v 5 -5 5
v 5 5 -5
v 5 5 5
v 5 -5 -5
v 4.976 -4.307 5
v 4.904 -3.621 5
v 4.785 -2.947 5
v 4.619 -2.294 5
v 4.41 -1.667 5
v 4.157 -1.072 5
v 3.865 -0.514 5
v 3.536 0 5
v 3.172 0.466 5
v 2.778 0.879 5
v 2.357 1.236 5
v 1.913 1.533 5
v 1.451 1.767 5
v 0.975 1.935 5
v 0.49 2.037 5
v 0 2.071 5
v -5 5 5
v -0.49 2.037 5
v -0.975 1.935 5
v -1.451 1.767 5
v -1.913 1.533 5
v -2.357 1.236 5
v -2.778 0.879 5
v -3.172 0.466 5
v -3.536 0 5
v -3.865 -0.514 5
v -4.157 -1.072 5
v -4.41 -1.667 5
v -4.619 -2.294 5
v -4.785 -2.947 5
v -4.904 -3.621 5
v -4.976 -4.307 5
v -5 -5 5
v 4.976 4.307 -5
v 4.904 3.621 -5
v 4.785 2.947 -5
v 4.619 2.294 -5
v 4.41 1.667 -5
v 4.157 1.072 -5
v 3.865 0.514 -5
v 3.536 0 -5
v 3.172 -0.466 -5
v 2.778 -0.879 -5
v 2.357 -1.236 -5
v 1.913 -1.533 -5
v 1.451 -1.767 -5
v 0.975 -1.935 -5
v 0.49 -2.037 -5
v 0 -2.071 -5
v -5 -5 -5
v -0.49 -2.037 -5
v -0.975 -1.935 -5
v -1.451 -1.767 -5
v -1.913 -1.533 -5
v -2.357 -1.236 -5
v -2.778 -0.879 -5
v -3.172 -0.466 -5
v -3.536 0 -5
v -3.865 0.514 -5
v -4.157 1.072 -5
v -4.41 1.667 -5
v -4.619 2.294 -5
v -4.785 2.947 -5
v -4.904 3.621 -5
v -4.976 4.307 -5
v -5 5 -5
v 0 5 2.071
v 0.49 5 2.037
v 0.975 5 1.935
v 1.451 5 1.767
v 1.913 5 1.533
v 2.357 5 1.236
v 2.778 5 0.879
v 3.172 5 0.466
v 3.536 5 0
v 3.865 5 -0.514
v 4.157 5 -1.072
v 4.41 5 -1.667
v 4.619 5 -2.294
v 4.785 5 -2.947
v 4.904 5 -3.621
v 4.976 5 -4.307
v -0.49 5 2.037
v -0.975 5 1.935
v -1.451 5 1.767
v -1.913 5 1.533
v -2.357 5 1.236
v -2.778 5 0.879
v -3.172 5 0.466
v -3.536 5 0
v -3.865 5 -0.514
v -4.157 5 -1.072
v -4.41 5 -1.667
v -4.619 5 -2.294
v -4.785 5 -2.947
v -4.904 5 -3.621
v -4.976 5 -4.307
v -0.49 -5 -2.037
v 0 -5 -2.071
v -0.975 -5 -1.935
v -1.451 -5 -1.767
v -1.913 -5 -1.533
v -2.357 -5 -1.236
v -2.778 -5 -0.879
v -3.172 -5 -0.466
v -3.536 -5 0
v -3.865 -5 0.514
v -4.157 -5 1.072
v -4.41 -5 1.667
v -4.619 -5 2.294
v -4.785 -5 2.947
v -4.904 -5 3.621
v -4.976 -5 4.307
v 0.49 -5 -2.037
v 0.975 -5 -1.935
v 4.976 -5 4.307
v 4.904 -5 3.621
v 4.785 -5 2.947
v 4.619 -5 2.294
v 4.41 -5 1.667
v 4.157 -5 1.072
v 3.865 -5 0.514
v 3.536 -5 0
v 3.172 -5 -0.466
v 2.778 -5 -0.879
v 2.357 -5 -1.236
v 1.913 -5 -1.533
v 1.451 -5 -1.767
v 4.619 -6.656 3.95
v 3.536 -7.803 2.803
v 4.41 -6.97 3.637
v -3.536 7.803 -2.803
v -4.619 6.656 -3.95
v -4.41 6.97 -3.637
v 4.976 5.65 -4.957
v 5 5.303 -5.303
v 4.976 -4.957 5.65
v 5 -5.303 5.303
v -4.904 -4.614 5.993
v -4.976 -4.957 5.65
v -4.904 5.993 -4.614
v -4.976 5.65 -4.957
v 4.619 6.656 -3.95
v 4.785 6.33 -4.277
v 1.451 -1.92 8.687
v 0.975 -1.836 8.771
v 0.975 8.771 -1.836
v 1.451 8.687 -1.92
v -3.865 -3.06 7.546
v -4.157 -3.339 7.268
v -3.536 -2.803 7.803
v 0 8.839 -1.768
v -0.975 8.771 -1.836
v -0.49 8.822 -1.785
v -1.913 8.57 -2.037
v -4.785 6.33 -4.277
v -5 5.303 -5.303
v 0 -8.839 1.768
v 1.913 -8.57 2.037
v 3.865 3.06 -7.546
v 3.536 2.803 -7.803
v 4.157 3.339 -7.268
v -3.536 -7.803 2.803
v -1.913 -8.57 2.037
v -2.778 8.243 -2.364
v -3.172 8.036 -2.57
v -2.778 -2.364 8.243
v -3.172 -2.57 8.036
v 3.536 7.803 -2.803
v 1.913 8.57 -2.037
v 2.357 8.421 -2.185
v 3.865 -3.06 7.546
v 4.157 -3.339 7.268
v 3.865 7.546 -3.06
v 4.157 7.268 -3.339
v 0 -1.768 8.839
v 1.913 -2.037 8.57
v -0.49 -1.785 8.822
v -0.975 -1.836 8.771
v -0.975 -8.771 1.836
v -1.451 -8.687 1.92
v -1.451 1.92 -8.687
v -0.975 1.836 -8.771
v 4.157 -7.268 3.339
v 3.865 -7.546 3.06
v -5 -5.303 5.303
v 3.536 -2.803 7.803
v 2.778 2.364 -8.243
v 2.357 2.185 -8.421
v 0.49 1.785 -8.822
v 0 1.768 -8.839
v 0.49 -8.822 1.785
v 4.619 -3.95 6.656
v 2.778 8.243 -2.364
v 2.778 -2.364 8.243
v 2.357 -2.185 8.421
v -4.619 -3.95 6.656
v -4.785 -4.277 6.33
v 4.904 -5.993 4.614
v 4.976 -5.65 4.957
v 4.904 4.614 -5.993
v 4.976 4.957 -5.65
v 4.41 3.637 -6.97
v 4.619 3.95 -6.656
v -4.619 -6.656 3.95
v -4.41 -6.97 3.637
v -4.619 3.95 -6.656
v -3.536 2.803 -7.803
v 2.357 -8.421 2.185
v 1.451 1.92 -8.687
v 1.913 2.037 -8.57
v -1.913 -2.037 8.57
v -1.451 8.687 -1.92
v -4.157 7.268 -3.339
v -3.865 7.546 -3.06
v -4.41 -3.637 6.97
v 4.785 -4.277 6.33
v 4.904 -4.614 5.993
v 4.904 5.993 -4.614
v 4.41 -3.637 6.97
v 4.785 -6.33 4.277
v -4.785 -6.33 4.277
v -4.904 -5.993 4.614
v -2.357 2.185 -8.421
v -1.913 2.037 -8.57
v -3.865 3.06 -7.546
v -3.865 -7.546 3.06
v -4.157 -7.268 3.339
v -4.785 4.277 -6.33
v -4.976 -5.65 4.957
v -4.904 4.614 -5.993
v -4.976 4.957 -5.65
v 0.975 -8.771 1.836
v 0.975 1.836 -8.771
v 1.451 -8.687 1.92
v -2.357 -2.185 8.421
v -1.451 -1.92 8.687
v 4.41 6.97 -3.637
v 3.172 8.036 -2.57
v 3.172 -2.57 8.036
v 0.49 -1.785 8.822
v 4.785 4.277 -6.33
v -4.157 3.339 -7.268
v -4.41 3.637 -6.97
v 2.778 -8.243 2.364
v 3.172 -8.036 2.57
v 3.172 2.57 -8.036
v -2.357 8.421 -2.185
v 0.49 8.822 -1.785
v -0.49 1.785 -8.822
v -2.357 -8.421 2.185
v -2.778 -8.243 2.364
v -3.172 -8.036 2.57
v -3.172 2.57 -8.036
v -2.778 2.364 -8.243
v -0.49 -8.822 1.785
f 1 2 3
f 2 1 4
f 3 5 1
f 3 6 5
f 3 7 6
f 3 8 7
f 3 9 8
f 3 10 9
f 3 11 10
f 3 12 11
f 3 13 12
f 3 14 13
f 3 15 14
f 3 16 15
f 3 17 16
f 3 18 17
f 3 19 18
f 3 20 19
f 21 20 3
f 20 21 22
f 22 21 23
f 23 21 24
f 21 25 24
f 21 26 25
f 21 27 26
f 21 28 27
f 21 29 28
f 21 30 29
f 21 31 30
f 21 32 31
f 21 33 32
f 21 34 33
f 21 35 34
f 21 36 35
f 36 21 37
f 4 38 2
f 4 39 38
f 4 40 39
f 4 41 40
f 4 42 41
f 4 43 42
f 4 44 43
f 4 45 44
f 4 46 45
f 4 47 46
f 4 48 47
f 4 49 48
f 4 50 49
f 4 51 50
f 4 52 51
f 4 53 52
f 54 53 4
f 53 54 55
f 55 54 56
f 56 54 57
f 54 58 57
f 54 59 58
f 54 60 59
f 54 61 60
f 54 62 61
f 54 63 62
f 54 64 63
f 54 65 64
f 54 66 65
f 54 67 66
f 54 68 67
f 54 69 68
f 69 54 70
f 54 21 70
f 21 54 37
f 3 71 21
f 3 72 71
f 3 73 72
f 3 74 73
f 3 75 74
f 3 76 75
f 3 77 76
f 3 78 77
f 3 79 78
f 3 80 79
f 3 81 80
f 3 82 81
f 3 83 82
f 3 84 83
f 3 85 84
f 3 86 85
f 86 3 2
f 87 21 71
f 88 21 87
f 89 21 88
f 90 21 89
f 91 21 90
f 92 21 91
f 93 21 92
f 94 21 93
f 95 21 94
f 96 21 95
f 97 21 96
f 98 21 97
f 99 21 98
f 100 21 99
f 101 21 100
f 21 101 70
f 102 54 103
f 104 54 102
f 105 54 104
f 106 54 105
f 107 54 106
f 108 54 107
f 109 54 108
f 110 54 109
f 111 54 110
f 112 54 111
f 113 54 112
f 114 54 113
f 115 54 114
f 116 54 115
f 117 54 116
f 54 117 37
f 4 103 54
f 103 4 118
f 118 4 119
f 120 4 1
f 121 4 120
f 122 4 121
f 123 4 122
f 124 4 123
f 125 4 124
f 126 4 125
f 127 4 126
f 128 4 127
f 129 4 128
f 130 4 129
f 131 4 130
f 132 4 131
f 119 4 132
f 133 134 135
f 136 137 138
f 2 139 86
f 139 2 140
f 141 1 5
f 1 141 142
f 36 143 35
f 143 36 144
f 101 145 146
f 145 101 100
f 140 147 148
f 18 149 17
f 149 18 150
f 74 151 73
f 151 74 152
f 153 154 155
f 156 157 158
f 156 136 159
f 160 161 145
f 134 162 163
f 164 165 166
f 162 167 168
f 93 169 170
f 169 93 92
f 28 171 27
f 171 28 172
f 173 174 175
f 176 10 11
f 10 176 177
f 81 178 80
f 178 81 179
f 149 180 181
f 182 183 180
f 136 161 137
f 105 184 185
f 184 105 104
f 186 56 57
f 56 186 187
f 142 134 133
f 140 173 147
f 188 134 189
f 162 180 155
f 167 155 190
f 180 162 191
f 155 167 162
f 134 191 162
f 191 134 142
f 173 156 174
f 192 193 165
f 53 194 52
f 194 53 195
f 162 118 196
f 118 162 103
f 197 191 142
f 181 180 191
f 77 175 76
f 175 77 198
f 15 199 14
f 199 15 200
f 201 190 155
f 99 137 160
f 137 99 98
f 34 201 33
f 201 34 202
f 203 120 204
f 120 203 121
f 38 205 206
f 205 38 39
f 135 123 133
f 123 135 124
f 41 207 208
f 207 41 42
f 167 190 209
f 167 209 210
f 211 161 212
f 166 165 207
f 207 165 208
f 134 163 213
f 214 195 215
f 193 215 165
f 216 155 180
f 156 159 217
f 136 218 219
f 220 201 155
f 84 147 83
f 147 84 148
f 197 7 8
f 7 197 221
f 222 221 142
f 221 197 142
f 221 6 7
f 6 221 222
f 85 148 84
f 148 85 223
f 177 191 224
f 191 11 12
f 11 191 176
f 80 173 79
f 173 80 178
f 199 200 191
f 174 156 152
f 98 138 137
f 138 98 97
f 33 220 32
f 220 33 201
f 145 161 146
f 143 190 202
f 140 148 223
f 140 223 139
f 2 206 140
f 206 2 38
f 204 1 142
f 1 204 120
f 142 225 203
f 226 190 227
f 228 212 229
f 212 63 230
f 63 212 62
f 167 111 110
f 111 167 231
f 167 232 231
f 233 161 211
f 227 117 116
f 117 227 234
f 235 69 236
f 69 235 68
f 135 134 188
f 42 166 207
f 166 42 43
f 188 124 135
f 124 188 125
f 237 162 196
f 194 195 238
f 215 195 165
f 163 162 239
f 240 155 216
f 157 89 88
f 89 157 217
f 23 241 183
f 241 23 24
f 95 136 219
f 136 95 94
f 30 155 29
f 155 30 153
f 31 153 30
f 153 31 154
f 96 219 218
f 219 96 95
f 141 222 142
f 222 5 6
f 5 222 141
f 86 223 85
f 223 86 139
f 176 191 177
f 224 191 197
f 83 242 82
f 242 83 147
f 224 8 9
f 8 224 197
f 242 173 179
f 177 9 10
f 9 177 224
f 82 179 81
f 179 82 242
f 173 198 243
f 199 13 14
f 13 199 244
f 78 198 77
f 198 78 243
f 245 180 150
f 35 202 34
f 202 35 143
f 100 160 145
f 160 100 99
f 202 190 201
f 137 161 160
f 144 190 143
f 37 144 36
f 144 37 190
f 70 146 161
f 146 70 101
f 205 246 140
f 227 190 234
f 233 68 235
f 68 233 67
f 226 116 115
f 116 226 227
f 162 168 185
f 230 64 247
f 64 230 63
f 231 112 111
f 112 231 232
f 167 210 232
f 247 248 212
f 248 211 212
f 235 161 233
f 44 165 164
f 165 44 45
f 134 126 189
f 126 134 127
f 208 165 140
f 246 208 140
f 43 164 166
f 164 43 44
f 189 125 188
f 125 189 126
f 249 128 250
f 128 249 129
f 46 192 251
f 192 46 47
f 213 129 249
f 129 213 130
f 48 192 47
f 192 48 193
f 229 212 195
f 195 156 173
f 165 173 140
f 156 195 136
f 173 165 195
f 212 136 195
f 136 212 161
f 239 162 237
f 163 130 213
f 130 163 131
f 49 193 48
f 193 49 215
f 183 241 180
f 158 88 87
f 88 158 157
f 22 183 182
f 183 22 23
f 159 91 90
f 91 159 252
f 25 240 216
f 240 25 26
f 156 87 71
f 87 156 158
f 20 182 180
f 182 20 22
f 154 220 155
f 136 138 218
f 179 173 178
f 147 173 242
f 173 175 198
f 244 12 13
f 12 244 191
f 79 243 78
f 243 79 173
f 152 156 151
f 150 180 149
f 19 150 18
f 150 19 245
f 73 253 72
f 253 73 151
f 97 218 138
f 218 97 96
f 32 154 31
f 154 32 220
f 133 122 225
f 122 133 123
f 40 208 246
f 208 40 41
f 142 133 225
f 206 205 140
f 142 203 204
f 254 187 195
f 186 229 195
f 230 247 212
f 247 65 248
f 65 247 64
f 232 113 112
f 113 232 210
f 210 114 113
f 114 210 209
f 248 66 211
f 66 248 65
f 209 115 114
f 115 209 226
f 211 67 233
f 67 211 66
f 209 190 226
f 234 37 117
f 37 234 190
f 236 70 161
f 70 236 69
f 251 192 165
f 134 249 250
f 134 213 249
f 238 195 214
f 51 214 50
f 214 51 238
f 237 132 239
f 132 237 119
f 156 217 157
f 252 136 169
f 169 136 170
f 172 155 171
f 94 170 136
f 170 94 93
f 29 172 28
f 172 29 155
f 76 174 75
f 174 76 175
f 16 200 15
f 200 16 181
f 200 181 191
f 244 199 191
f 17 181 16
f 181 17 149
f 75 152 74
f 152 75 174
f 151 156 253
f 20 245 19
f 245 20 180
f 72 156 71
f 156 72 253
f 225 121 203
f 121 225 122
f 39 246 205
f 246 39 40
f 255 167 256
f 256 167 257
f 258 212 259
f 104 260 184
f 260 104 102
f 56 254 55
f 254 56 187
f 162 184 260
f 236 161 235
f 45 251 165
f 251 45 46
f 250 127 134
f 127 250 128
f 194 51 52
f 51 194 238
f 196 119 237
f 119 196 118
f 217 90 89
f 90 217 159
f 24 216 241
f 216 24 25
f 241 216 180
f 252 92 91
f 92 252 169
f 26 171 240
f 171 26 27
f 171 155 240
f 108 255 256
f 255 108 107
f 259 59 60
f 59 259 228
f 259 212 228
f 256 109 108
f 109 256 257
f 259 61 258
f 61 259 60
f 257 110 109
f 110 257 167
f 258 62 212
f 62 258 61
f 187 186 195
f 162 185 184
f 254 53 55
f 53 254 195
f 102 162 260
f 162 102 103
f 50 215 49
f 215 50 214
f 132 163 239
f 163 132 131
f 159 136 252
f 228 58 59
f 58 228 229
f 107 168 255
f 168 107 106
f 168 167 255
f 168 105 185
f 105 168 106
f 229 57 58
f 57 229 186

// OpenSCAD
// Set fragment number for roundings
$fn = $preview ? 32 : 64;

// Size of the Cube (all directions)
cuSize = 10;

// The diameter of the Cylinder
cyDia = 10;

// The height of the Cylinder
cyHei = 15;

// X-Rotation of the Cylinder
rX = 45;

// Create Cube and rotate Cylinder by 'rX'
cube(size = [cuSize, cuSize, cuSize], center = true);
rotate([rX, 0, 0])
    cylinder(d = cyDia, h = cyHei, center = true);
